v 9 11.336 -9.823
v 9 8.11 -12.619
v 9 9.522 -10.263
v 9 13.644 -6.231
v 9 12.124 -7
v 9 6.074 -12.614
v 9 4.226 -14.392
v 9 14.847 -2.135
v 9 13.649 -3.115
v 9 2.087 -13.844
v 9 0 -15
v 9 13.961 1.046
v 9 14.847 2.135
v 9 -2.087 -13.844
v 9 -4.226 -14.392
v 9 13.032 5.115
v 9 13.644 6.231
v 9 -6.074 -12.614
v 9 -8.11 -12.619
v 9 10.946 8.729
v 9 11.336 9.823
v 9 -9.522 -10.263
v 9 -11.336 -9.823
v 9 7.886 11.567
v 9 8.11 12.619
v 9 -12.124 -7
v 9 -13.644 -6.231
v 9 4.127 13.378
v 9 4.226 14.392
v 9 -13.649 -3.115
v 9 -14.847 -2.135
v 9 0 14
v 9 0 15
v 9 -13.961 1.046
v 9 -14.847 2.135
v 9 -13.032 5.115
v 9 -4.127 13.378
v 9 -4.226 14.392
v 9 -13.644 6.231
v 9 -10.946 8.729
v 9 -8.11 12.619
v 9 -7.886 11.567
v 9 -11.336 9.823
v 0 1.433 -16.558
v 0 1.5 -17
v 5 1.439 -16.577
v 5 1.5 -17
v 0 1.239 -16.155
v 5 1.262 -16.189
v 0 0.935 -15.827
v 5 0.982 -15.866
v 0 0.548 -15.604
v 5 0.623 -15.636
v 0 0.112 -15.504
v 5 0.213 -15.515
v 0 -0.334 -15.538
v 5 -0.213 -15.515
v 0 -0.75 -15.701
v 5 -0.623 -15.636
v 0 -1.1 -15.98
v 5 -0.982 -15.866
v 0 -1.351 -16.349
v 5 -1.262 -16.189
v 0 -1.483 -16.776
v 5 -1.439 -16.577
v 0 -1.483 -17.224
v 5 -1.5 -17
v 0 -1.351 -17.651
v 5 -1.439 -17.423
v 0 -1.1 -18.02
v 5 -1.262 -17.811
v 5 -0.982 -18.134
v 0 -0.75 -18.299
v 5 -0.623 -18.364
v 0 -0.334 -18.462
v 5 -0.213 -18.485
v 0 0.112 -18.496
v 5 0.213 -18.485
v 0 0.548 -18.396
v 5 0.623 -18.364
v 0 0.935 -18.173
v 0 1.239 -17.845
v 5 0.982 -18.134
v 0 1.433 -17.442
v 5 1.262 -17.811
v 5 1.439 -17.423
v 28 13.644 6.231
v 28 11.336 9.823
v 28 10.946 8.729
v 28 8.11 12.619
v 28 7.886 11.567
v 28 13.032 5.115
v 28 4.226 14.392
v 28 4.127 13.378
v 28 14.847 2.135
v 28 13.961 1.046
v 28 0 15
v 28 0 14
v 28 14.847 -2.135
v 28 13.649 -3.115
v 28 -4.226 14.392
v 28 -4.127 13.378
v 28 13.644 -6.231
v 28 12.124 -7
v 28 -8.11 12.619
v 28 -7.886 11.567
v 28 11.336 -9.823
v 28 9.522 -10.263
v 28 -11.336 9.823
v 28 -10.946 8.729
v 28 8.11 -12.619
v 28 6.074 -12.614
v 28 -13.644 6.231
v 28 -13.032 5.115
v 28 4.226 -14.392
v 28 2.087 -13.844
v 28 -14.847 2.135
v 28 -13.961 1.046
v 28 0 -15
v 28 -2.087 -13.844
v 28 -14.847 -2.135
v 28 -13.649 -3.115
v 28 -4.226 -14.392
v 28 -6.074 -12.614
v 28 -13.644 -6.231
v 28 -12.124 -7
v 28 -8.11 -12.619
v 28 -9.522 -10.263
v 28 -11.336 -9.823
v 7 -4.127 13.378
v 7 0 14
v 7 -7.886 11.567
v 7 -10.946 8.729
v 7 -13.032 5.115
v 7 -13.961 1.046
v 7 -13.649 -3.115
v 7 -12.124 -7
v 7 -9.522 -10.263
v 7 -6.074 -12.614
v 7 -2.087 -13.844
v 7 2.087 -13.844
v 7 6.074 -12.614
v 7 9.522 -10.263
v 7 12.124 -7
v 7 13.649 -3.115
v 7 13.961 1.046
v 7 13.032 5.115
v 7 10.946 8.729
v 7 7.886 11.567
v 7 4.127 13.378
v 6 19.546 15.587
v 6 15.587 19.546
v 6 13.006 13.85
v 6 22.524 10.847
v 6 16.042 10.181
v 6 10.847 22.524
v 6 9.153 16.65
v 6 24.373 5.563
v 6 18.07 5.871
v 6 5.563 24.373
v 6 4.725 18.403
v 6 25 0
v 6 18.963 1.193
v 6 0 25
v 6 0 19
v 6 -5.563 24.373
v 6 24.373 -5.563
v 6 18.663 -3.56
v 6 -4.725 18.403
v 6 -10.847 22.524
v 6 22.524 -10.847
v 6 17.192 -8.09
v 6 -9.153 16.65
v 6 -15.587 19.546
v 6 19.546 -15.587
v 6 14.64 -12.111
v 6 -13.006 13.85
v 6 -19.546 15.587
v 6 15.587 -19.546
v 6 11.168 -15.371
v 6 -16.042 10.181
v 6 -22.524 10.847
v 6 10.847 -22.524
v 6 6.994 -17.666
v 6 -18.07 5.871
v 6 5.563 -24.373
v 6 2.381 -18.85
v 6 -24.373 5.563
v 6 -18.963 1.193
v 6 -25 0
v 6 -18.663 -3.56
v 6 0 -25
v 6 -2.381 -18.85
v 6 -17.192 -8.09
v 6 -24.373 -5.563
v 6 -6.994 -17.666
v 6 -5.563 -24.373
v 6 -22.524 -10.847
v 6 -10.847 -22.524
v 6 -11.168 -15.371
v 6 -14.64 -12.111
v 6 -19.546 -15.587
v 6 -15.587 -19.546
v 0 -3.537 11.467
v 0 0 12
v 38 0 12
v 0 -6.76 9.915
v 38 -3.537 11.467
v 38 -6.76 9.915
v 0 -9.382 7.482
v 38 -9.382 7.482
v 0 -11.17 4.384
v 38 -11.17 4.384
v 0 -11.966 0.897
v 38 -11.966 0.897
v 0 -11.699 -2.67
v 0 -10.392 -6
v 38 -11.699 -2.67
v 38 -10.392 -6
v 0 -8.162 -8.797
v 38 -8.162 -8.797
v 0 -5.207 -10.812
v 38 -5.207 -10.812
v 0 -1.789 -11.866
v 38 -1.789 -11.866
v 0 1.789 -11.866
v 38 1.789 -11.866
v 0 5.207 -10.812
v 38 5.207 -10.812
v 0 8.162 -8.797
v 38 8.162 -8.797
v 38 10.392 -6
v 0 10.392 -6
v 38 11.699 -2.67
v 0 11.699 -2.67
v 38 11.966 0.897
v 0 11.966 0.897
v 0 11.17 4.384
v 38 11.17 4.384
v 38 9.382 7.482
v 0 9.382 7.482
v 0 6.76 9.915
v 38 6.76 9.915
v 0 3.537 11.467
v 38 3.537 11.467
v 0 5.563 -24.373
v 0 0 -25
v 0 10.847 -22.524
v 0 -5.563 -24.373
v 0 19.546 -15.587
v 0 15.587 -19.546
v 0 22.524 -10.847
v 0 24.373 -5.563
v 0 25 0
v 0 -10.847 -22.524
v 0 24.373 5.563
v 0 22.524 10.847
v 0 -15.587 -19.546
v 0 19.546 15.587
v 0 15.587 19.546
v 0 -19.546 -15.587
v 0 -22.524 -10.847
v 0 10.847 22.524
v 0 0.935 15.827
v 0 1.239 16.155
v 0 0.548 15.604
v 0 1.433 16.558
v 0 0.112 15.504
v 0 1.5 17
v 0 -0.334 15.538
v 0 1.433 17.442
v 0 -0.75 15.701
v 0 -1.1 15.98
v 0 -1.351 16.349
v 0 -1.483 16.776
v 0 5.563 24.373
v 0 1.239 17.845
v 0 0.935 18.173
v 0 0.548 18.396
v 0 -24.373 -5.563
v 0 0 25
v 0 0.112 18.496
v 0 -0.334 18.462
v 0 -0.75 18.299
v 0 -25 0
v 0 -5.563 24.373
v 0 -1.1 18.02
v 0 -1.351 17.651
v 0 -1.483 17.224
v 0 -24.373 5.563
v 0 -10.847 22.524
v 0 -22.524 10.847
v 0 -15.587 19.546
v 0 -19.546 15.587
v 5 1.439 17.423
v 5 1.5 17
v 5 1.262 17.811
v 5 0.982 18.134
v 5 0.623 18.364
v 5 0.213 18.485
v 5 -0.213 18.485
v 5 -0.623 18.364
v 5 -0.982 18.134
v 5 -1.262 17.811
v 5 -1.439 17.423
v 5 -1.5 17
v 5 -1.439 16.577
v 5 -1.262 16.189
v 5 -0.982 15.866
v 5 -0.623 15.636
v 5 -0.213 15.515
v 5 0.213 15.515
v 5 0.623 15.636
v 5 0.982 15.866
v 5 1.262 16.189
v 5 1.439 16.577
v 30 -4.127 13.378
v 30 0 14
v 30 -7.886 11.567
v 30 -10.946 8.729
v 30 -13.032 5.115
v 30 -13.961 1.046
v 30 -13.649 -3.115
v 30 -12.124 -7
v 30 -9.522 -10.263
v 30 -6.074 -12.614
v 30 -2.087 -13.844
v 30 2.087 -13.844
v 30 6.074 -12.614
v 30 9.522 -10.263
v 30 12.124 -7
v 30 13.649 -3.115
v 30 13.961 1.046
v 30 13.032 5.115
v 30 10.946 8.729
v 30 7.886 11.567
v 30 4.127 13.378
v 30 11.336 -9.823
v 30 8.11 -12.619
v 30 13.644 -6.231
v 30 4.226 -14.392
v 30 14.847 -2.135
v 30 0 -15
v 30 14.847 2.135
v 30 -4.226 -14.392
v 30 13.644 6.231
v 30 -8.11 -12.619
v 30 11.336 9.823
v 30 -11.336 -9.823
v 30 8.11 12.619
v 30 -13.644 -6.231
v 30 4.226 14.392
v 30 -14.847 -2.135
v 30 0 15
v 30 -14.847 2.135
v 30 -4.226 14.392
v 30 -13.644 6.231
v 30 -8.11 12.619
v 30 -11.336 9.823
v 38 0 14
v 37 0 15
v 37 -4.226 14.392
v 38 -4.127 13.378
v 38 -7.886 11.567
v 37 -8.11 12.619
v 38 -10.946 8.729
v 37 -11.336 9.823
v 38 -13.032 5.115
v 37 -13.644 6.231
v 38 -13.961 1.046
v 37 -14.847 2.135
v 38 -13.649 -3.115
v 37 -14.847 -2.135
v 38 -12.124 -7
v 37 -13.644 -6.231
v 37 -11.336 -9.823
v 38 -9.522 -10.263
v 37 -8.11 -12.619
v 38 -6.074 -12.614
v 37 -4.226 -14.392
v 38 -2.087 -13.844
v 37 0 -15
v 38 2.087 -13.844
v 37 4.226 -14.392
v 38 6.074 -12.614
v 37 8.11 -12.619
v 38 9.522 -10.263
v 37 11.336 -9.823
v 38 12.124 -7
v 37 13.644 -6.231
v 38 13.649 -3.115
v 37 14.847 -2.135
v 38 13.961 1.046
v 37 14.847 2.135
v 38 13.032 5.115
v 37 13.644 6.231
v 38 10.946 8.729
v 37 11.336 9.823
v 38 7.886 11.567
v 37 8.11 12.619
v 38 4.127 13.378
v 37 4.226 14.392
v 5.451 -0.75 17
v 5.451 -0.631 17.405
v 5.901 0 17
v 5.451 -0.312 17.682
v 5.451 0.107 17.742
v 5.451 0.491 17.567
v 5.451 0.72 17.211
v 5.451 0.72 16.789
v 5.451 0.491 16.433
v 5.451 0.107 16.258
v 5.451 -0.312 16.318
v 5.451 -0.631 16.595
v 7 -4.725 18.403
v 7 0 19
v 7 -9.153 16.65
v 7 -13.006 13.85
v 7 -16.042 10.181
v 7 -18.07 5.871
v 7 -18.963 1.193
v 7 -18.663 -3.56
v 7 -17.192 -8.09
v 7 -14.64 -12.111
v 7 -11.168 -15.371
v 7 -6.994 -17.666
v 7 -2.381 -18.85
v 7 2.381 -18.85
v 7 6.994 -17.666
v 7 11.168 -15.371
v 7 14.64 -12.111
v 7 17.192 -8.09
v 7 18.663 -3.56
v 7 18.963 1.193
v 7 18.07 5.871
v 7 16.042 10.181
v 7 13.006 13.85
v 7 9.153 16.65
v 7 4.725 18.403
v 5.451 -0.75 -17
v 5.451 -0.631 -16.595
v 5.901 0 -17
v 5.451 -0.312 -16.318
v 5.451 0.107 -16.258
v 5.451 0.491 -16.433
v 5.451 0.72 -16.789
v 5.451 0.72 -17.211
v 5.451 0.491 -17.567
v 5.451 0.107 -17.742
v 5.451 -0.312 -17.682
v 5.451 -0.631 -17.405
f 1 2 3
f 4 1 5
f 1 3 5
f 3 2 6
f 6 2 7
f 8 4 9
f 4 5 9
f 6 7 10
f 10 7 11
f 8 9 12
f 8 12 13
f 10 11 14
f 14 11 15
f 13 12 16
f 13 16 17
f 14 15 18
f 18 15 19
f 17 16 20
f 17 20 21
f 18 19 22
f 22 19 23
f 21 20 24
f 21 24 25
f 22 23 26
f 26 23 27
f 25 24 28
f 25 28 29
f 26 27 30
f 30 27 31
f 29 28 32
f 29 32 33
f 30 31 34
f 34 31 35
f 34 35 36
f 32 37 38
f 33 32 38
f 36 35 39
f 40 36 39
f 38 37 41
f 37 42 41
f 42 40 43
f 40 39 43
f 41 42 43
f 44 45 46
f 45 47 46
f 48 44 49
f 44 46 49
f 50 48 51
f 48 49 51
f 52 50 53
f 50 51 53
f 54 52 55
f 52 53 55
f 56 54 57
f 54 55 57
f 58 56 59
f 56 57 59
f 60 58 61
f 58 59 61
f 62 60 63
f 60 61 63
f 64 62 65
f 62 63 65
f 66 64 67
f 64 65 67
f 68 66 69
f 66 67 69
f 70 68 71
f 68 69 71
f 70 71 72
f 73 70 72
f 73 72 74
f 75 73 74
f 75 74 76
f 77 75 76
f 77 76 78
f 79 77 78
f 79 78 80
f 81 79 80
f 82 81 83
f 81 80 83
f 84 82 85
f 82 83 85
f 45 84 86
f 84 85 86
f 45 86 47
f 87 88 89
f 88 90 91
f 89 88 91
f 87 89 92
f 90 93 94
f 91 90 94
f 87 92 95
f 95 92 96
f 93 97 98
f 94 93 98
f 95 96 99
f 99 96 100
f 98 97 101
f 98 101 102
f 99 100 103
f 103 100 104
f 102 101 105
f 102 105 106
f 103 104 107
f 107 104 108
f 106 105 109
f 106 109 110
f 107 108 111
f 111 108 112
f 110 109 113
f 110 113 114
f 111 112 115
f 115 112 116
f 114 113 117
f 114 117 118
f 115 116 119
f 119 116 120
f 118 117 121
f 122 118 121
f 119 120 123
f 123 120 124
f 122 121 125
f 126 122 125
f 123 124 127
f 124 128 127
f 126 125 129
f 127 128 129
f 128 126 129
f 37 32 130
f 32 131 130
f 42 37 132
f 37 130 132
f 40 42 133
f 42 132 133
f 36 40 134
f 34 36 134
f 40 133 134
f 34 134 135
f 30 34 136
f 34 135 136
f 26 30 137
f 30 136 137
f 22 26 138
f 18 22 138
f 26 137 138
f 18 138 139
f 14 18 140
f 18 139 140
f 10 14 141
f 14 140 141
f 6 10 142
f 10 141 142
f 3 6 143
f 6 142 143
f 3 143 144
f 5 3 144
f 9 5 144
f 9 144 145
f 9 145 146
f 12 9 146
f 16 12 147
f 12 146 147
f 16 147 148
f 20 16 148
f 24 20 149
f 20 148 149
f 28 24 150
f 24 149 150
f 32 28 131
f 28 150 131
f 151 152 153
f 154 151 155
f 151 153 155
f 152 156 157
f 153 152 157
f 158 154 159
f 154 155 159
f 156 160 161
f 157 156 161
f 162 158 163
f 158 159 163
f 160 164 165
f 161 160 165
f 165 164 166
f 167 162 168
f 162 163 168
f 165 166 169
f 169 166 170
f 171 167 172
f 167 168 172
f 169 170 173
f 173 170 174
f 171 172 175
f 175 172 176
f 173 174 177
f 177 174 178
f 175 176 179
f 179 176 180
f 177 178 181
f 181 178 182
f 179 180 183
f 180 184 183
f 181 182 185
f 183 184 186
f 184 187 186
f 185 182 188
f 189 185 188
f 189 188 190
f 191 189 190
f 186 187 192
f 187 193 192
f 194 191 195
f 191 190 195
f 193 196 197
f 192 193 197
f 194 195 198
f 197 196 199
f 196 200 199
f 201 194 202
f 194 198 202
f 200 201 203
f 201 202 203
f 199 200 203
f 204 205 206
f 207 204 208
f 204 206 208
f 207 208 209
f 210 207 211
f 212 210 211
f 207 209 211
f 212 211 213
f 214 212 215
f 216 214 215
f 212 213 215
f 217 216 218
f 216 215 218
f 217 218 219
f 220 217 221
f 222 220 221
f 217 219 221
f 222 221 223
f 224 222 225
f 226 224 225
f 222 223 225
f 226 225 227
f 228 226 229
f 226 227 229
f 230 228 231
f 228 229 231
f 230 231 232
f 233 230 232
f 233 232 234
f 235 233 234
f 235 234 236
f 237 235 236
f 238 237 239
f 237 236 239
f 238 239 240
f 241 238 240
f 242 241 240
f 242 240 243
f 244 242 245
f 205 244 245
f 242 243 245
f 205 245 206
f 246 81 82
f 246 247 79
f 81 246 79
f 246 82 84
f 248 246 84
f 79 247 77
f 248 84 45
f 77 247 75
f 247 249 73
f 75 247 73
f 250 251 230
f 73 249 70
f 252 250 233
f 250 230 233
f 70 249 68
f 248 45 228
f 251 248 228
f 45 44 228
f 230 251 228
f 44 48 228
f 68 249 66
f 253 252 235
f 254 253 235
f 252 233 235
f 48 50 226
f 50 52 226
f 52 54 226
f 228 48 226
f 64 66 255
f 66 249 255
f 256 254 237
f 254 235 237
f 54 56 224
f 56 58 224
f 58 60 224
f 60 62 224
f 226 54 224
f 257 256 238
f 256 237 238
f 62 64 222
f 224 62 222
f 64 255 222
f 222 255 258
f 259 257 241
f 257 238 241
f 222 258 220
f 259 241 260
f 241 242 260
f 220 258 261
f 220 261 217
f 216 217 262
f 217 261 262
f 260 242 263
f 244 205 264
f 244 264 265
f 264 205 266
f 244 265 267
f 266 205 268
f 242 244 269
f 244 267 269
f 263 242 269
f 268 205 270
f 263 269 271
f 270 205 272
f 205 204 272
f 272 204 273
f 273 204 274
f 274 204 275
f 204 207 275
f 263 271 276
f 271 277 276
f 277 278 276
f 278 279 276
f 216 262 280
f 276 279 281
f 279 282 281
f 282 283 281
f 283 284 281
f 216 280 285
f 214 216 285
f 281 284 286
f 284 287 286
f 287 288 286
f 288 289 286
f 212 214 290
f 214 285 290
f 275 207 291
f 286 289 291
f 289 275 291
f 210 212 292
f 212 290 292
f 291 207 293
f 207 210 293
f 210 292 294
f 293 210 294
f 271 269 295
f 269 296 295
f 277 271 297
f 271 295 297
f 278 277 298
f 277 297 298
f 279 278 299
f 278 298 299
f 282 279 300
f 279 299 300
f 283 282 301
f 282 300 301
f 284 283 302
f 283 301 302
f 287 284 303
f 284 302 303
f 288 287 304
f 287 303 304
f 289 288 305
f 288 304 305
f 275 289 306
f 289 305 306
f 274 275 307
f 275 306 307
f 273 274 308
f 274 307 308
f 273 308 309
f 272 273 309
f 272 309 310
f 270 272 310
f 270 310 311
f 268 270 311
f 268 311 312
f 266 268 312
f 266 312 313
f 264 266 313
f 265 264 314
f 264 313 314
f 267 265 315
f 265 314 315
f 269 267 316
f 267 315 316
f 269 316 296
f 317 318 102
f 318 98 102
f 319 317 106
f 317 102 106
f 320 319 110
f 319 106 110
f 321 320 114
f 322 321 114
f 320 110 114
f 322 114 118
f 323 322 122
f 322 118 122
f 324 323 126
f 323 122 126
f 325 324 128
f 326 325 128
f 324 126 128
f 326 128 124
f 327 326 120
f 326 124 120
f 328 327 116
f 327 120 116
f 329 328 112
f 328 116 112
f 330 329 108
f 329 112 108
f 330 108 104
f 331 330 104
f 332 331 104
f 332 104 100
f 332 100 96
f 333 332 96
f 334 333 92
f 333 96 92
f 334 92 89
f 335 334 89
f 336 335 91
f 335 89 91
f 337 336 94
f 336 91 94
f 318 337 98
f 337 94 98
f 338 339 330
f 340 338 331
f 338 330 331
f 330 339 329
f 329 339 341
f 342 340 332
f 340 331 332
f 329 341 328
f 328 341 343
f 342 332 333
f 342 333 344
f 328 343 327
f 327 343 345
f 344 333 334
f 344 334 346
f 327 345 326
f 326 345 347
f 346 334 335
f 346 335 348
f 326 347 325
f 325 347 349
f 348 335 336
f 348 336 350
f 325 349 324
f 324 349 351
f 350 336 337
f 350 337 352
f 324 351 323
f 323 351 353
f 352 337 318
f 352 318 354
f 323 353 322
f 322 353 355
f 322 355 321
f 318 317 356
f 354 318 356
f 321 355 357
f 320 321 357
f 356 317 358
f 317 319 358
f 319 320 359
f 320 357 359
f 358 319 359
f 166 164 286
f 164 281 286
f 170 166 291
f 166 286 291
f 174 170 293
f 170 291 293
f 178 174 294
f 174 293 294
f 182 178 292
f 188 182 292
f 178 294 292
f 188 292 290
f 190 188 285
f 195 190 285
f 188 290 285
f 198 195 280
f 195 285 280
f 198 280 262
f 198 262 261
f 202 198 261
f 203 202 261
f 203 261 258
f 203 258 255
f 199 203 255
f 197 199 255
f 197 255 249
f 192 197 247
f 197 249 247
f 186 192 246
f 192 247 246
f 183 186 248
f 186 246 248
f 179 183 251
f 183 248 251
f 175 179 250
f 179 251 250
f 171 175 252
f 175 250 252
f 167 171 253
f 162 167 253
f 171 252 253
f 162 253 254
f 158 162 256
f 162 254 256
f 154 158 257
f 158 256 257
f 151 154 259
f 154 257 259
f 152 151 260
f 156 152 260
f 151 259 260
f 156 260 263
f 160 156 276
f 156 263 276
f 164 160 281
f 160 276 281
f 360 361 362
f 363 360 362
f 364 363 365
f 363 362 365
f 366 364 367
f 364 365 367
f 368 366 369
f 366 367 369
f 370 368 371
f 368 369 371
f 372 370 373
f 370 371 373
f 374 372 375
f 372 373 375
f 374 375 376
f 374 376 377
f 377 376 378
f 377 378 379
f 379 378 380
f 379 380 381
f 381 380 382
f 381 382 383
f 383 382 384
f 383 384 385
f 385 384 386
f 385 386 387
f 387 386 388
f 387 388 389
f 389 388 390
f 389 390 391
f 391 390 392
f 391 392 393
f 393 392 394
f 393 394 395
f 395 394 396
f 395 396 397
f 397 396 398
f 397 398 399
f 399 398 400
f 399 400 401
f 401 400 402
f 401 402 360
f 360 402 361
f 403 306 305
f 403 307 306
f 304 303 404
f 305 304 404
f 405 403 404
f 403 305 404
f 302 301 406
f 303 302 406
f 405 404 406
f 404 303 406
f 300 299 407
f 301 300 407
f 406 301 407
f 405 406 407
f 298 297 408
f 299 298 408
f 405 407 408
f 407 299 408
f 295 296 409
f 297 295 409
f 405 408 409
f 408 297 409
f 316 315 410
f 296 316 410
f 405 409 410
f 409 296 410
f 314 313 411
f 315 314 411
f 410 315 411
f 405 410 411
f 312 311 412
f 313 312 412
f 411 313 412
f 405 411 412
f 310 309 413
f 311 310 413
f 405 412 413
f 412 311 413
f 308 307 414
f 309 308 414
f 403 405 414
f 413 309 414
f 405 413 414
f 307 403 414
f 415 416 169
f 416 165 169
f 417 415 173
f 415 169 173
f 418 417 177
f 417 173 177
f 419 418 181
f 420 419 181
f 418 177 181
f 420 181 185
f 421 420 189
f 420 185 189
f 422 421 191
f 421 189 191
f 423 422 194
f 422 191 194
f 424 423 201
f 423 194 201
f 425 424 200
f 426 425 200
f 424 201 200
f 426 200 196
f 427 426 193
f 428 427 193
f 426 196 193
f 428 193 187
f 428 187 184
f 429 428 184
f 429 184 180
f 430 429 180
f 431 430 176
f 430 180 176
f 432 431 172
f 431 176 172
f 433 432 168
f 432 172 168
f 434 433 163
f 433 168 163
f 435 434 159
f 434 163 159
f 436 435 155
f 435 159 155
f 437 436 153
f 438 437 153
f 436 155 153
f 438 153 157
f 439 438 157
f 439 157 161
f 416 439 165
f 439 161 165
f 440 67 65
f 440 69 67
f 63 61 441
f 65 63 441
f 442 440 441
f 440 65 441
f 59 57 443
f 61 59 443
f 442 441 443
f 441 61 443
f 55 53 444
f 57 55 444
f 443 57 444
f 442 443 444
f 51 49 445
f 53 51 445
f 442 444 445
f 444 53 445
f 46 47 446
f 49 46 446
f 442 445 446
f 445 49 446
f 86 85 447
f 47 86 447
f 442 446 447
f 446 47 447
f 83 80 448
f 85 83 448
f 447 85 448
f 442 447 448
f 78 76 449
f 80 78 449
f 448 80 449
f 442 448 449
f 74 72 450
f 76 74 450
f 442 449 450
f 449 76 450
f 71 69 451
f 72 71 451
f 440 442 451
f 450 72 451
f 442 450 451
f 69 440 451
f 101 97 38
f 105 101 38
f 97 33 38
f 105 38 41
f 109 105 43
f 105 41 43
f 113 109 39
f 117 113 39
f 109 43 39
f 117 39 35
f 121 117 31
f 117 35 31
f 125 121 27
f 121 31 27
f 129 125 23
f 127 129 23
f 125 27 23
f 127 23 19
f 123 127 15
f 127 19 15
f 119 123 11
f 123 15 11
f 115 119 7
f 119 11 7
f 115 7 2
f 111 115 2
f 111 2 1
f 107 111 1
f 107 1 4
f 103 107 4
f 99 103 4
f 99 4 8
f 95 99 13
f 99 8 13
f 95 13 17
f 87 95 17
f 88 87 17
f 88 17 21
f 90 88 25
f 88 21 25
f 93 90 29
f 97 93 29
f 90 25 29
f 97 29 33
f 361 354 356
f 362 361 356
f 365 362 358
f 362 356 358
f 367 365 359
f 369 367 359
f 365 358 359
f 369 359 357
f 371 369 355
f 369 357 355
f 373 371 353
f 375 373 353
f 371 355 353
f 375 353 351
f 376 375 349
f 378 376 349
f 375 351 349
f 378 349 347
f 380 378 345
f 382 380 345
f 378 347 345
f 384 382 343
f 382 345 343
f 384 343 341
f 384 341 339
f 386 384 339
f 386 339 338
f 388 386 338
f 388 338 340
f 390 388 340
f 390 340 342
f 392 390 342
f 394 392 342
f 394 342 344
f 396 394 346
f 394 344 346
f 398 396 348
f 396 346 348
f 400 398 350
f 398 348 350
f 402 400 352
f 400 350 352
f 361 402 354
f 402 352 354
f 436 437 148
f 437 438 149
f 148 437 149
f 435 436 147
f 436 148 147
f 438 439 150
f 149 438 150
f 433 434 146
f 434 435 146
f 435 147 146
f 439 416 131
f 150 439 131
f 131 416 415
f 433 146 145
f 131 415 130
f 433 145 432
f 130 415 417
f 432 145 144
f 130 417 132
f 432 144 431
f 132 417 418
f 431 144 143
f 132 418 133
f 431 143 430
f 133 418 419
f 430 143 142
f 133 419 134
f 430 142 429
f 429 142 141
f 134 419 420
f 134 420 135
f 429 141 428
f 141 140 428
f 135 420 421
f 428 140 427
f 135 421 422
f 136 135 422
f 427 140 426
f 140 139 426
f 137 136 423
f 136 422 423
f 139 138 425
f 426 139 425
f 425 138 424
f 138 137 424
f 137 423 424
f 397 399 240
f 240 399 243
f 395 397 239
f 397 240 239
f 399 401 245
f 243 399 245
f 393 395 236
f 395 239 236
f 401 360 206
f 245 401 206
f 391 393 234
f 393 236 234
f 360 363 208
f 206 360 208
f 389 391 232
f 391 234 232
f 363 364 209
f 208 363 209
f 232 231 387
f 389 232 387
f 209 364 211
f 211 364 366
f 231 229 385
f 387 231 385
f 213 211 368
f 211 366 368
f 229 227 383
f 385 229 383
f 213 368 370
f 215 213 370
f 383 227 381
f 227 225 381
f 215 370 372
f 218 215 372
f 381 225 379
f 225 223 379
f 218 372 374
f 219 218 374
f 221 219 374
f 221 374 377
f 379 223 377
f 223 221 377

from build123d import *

# Parameters (mm, degrees)
F2_SIZE  = 1
F4_D     = 3
F4_DEPTH = 5
F4_TIP   = 0.9012909285


with BuildPart() as f1:
    # F0 (on Front) → F1 (revolve)
    with BuildSketch(Plane.XZ):
        Polygon((0, 25), (0, 12), (38, 12), (38, 15), (30, 15), (30, 14), (28, 14), (28, 15), (9, 15), (9, 14), (7, 14), (7, 19), (6, 19), (6, 25), align=None)
    revolve(axis=Axis((16.4548096063, 0, 0), (1, 0, 0)))

    # F2
    f2_edges = [f1.edges().sort_by_distance(p)[0] for p in [
        (38, 0, -15),
    ]]
    chamfer(f2_edges, length=F2_SIZE)

    # F4
    with Locations(Plane(origin=(0, 0, 0), x_dir=(0, -1, 0), z_dir=(-1, 0, 0))):
        with Locations((0, 17), (0, -17)):
            Hole(F4_D / 2, depth=F4_DEPTH)
            with Locations((0, 0, -(F4_DEPTH + F4_TIP / 2))):  # 118° drill point
                Cone(0, F4_D / 2, F4_TIP, mode=Mode.SUBTRACT)


solid = f1.part
